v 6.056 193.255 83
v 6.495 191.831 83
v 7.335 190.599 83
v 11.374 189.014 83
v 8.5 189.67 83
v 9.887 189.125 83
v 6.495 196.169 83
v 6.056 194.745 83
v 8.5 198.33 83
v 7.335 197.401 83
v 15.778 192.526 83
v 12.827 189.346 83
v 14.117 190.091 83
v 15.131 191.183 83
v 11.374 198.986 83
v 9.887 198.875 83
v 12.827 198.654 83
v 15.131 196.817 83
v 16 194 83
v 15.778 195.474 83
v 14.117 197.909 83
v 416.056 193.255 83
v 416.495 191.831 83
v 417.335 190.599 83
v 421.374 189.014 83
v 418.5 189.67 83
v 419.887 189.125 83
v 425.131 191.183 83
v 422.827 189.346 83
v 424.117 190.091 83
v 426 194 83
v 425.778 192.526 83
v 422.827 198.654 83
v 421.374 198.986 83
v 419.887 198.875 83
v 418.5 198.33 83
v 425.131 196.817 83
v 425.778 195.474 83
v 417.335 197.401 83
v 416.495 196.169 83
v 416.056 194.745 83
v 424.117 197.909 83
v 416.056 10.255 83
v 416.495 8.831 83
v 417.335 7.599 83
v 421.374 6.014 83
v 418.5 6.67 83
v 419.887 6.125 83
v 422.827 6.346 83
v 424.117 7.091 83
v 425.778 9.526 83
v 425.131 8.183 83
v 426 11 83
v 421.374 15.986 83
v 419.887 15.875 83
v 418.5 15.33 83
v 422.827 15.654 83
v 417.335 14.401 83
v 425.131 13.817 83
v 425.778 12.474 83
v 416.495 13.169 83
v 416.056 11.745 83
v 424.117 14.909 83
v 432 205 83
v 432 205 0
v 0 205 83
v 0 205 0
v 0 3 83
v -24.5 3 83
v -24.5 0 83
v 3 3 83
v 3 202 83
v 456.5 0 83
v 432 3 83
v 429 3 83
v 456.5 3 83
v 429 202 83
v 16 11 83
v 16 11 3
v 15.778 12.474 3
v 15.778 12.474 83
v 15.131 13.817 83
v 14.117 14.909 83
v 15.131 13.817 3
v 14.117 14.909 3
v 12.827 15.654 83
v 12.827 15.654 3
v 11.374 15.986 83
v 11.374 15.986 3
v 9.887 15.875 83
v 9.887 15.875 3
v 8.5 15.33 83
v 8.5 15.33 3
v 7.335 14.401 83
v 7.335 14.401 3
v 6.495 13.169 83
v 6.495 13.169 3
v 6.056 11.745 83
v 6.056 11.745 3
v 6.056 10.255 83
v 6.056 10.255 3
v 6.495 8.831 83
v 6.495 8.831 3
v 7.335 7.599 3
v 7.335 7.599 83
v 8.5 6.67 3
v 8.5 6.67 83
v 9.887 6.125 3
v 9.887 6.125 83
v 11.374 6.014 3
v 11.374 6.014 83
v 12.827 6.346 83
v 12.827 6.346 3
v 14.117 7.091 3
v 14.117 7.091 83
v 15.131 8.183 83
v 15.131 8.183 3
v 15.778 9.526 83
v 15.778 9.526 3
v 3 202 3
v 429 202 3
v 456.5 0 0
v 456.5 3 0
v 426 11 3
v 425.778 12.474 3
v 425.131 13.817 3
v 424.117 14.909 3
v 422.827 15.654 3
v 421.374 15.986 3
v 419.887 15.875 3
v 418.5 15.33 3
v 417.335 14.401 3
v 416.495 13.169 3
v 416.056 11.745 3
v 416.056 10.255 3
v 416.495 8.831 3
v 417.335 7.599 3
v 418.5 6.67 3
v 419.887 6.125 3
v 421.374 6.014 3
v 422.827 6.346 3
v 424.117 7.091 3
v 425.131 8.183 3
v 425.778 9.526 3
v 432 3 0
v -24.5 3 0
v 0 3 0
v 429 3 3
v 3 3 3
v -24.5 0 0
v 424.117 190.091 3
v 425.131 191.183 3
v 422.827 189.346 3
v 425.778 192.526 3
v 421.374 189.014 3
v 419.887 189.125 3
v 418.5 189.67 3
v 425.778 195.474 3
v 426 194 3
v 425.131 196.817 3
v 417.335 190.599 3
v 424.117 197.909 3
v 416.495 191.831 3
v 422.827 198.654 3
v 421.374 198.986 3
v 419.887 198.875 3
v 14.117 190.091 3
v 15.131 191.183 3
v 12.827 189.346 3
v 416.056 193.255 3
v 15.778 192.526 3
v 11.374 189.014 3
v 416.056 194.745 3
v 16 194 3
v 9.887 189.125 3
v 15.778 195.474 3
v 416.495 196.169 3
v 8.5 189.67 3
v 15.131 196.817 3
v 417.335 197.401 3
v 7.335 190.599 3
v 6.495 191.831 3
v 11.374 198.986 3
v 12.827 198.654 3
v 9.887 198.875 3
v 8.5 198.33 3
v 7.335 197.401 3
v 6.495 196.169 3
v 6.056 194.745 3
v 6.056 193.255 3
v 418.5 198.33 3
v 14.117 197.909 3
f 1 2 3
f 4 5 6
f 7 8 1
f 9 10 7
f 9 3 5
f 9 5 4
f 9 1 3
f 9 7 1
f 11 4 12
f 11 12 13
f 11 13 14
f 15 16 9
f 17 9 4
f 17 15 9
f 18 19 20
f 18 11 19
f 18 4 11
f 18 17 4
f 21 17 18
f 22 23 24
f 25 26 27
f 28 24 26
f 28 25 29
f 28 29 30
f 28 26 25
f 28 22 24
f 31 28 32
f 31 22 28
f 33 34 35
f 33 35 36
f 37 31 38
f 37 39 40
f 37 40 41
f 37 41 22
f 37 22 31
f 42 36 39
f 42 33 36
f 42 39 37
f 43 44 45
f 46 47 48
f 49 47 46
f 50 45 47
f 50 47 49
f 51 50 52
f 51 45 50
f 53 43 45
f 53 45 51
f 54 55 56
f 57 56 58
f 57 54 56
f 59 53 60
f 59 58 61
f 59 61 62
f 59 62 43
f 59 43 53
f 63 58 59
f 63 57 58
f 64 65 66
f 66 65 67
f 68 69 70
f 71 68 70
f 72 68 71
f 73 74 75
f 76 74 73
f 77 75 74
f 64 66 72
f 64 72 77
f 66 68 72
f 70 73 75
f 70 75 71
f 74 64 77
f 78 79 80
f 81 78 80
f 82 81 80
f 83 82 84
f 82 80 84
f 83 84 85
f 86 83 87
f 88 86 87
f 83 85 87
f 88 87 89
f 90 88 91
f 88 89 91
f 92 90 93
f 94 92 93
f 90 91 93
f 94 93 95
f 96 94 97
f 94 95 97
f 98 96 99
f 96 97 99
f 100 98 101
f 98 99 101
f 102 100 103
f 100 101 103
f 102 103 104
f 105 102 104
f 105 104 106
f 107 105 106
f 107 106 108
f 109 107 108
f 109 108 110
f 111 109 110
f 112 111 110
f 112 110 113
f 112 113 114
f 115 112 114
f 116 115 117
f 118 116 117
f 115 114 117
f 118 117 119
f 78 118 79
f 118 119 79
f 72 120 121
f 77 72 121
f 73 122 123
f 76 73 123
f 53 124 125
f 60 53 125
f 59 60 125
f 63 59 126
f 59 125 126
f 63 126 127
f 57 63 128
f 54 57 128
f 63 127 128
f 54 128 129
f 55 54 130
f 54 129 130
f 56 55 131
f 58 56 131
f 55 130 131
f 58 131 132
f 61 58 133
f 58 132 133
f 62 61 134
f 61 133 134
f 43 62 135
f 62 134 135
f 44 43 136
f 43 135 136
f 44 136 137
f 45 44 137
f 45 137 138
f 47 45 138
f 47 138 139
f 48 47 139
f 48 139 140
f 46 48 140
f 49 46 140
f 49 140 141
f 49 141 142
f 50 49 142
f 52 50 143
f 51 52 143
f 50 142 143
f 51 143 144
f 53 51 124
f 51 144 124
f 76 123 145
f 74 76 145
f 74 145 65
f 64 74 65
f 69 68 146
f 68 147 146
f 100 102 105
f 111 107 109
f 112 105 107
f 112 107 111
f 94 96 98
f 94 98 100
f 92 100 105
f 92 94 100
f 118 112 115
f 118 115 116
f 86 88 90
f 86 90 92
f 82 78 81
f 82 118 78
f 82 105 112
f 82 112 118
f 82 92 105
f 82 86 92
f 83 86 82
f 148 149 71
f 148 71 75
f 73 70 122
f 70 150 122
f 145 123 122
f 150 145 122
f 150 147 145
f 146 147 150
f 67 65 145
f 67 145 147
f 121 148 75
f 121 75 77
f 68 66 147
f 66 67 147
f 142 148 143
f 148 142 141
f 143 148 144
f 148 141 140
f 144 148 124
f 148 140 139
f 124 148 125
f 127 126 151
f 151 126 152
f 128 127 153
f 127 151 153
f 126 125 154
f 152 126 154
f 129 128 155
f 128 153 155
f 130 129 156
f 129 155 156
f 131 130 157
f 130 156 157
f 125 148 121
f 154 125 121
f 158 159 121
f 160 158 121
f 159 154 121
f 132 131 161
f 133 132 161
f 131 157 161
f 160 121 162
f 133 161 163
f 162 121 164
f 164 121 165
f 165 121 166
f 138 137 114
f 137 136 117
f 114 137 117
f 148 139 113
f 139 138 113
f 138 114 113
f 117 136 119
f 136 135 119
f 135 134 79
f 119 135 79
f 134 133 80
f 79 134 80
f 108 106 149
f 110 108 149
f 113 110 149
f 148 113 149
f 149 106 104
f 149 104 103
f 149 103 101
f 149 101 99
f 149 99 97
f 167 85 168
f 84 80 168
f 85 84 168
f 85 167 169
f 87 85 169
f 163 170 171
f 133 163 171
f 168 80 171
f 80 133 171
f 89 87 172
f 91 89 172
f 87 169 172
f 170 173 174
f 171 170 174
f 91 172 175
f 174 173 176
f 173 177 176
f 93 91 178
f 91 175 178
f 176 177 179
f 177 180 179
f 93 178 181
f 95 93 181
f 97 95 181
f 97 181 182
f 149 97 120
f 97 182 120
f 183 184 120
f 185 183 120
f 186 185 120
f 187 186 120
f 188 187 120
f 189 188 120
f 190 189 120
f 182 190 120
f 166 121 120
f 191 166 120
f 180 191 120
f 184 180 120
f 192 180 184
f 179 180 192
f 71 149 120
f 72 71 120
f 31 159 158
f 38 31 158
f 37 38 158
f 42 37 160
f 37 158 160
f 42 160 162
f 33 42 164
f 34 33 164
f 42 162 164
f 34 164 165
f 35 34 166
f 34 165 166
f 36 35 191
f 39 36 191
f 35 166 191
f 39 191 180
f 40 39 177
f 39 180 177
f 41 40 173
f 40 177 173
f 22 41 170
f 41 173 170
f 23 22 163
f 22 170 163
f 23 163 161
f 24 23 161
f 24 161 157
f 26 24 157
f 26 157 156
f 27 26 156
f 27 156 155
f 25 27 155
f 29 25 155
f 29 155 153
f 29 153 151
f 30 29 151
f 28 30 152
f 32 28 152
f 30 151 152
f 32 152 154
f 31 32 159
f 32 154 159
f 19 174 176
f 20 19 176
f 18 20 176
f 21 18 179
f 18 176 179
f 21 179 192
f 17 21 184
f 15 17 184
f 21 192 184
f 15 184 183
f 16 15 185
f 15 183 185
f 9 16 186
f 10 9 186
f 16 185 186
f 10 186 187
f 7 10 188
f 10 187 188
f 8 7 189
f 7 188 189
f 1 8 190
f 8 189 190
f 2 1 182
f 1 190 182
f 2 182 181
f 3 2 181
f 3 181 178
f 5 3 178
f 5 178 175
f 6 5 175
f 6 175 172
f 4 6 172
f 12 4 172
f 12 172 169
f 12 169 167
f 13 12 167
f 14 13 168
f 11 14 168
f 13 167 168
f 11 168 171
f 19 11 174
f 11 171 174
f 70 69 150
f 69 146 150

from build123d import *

# Parameters (mm, degrees)
BOSS_EXTRUDE1_DEPTH = 3
SKETCH2_W           = 426
SKETCH2_H           = 199
BOSS_EXTRUDE2_DEPTH = 80
SKETCH3_R           = 5
BOSS_EXTRUDE3_DEPTH = 80


with BuildPart() as part:
    # Sketch1 → Boss-Extrude1 (new body)
    with BuildSketch(Plane.XY):
        Polygon((0, 0), (-24.5, 0), (-24.5, 3), (0, 3), (0, 205), (432, 205), (432, 3), (456.5, 3), (456.5, 0), (432, 0), align=None)
    extrude(amount=BOSS_EXTRUDE1_DEPTH)

    # Sketch2 → Boss-Extrude2 (add)
    with BuildSketch(Plane.XY.offset(3)):
        Polygon((432, 205), (0, 205), (0, 3), (-24.5, 3), (-24.5, 0), (456.5, 0), (456.5, 3), (432, 3), align=None)
        with Locations((216, 102.5)):
            Rectangle(SKETCH2_W, SKETCH2_H, mode=Mode.SUBTRACT)
    extrude(amount=BOSS_EXTRUDE2_DEPTH)

    # Sketch3 → Boss-Extrude3 (add)
    with BuildSketch(Plane.XY.offset(3)):
        with Locations((11, 194)):
            Circle(SKETCH3_R)
        with Locations((421, 194)):
            Circle(SKETCH3_R)
        with Locations((421, 11)):
            Circle(SKETCH3_R)
        with Locations((11, 11)):
            Circle(SKETCH3_R)
    extrude(amount=BOSS_EXTRUDE3_DEPTH)


solid = part.part
